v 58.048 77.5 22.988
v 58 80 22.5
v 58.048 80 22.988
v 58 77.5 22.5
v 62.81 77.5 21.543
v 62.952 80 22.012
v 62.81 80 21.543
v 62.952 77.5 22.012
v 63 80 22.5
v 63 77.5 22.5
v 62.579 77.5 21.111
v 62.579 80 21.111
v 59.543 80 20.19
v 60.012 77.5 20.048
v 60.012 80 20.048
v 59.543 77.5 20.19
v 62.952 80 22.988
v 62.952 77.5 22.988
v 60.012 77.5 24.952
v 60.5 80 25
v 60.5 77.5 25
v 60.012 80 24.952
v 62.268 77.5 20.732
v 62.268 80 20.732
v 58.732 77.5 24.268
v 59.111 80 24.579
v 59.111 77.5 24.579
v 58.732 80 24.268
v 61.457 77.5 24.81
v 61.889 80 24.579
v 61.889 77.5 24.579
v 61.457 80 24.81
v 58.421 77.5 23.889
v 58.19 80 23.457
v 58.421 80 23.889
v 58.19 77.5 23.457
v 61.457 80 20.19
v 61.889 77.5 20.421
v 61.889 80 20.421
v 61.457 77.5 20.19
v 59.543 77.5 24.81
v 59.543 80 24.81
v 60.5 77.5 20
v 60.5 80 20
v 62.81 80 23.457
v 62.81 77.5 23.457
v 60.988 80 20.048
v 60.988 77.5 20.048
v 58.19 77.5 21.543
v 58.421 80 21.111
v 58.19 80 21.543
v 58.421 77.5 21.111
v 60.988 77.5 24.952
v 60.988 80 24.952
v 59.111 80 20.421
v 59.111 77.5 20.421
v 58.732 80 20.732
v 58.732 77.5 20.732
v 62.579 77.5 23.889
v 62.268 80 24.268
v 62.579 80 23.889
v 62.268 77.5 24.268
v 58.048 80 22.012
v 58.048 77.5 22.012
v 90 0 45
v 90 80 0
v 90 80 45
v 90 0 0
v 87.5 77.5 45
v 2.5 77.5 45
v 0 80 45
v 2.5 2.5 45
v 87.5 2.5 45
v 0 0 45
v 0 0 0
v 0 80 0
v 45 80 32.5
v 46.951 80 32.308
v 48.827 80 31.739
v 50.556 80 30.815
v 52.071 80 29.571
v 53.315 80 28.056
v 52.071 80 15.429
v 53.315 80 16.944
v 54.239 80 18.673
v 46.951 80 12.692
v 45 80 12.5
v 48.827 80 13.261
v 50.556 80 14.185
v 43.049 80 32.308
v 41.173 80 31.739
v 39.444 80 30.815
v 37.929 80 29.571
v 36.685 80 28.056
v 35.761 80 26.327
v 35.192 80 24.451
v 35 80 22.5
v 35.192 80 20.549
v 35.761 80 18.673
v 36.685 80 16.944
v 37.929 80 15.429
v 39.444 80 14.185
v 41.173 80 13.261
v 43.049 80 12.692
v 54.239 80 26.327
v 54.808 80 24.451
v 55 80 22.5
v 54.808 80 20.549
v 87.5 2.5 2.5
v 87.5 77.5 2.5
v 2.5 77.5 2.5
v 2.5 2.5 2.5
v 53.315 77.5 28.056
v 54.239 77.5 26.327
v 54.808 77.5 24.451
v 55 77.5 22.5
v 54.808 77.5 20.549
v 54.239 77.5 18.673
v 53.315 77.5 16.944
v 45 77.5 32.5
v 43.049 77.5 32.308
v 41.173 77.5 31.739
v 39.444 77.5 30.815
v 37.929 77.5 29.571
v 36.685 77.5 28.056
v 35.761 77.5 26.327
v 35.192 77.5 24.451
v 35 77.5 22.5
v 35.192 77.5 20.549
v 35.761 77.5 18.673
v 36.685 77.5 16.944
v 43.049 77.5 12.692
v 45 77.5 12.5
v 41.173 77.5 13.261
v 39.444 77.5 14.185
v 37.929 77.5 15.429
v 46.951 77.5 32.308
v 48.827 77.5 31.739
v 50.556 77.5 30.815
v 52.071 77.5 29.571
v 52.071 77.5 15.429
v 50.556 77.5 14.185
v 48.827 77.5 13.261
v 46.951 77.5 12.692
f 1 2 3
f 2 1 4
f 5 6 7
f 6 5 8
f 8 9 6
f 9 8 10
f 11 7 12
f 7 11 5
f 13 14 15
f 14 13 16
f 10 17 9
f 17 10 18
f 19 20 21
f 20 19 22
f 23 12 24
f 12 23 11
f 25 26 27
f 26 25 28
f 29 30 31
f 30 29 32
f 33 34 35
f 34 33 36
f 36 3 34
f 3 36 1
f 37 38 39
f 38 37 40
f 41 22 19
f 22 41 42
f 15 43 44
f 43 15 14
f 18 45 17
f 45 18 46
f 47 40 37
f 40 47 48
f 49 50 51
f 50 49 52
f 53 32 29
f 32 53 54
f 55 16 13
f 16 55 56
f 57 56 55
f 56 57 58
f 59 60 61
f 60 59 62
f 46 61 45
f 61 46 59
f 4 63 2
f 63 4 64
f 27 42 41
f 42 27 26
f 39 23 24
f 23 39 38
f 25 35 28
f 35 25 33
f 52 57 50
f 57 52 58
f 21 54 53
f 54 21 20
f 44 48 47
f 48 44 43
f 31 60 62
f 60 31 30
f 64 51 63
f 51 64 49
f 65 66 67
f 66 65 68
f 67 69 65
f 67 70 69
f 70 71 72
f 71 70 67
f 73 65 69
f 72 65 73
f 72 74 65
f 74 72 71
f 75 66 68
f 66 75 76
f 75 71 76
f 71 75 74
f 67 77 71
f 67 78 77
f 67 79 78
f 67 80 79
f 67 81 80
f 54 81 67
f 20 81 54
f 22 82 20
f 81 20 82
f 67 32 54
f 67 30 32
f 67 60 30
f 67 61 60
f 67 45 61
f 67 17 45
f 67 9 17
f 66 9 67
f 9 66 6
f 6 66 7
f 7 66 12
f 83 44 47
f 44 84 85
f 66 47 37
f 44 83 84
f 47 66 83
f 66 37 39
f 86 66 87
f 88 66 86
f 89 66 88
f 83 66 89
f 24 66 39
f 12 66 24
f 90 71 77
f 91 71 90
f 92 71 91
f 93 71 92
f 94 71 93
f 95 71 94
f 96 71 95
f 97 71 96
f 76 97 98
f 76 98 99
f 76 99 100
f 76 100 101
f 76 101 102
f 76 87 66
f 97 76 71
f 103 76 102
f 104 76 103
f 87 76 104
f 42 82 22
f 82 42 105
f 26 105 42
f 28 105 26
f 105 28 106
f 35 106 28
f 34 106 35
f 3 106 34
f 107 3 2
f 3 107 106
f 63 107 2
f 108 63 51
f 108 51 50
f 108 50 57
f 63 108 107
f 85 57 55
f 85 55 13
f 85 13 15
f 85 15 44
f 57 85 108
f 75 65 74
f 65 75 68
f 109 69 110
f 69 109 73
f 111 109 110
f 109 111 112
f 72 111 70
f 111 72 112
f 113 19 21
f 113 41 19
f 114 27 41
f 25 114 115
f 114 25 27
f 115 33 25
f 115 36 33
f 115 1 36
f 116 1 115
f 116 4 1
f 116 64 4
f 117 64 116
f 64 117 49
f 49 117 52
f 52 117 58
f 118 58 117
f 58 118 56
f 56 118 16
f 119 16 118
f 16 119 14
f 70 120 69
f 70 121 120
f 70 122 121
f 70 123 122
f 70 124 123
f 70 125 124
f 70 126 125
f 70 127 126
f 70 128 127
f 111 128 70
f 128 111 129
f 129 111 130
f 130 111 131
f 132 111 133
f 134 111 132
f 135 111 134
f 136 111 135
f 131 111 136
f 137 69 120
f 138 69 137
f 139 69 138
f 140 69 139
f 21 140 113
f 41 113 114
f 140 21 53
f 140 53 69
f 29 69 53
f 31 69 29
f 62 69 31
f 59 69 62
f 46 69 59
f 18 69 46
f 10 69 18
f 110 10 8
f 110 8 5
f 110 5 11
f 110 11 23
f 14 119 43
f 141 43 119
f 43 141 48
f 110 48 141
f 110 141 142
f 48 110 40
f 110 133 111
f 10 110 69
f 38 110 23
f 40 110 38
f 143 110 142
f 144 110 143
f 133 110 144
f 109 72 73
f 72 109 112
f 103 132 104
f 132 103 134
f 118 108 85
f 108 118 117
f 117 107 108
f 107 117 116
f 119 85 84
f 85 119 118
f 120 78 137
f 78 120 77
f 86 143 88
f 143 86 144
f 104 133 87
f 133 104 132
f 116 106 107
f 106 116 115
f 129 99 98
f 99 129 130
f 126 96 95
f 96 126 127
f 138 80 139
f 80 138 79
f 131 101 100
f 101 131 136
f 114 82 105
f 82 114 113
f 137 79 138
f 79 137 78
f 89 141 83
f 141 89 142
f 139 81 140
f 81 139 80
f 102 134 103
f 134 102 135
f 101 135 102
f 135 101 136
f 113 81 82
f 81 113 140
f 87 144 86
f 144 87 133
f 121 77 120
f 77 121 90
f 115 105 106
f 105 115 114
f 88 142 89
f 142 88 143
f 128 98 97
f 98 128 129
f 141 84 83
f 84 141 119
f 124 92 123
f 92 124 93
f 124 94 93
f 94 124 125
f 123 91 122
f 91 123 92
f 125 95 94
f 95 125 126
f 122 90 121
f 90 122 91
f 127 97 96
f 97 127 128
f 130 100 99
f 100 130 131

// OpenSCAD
$fn = 32;

// ----------------------------------------------------------------------
// Vent box: roundvent enclosure
// ----------------------------------------------------------------------

// --- parameters (mm) ---
box_l = 90;               // box length, X
box_w = 80;               // box width, Y
box_h = 45;               // box height, Z
wall_t = 2.5;             // shell wall thickness
vent_d = 20;              // central vent diameter
ring_d = 5;               // ring hole diameter
n_ring = 6;               // holes in the ring
ring_r = 15.5;            // ring radius
fit_tol = 0.1;            // tolerance for press fits, mm
free_tol = 0.3;           // tolerance for clearance fits, mm

ring_step = 360 / n_ring;  // ring hole angular step

difference() {
  cube([box_l, box_w, box_h]);
  translate([wall_t, wall_t, wall_t])
    cube([box_l - 2 * wall_t, box_w - 2 * wall_t, box_h]);
  translate([box_l / 2, box_w - wall_t - 1, box_h / 2])
    rotate([-90, 0, 0]) cylinder(h = wall_t + 2, d = vent_d);
  for (i = [0 : n_ring - 1])
    translate([box_l / 2, box_w - wall_t - 1, box_h / 2])
      rotate([0, 0, i * ring_step])
        translate([ring_r, 0, 0]) rotate([-90, 0, 0])
          cylinder(h = wall_t + 2, d = ring_d);
}
